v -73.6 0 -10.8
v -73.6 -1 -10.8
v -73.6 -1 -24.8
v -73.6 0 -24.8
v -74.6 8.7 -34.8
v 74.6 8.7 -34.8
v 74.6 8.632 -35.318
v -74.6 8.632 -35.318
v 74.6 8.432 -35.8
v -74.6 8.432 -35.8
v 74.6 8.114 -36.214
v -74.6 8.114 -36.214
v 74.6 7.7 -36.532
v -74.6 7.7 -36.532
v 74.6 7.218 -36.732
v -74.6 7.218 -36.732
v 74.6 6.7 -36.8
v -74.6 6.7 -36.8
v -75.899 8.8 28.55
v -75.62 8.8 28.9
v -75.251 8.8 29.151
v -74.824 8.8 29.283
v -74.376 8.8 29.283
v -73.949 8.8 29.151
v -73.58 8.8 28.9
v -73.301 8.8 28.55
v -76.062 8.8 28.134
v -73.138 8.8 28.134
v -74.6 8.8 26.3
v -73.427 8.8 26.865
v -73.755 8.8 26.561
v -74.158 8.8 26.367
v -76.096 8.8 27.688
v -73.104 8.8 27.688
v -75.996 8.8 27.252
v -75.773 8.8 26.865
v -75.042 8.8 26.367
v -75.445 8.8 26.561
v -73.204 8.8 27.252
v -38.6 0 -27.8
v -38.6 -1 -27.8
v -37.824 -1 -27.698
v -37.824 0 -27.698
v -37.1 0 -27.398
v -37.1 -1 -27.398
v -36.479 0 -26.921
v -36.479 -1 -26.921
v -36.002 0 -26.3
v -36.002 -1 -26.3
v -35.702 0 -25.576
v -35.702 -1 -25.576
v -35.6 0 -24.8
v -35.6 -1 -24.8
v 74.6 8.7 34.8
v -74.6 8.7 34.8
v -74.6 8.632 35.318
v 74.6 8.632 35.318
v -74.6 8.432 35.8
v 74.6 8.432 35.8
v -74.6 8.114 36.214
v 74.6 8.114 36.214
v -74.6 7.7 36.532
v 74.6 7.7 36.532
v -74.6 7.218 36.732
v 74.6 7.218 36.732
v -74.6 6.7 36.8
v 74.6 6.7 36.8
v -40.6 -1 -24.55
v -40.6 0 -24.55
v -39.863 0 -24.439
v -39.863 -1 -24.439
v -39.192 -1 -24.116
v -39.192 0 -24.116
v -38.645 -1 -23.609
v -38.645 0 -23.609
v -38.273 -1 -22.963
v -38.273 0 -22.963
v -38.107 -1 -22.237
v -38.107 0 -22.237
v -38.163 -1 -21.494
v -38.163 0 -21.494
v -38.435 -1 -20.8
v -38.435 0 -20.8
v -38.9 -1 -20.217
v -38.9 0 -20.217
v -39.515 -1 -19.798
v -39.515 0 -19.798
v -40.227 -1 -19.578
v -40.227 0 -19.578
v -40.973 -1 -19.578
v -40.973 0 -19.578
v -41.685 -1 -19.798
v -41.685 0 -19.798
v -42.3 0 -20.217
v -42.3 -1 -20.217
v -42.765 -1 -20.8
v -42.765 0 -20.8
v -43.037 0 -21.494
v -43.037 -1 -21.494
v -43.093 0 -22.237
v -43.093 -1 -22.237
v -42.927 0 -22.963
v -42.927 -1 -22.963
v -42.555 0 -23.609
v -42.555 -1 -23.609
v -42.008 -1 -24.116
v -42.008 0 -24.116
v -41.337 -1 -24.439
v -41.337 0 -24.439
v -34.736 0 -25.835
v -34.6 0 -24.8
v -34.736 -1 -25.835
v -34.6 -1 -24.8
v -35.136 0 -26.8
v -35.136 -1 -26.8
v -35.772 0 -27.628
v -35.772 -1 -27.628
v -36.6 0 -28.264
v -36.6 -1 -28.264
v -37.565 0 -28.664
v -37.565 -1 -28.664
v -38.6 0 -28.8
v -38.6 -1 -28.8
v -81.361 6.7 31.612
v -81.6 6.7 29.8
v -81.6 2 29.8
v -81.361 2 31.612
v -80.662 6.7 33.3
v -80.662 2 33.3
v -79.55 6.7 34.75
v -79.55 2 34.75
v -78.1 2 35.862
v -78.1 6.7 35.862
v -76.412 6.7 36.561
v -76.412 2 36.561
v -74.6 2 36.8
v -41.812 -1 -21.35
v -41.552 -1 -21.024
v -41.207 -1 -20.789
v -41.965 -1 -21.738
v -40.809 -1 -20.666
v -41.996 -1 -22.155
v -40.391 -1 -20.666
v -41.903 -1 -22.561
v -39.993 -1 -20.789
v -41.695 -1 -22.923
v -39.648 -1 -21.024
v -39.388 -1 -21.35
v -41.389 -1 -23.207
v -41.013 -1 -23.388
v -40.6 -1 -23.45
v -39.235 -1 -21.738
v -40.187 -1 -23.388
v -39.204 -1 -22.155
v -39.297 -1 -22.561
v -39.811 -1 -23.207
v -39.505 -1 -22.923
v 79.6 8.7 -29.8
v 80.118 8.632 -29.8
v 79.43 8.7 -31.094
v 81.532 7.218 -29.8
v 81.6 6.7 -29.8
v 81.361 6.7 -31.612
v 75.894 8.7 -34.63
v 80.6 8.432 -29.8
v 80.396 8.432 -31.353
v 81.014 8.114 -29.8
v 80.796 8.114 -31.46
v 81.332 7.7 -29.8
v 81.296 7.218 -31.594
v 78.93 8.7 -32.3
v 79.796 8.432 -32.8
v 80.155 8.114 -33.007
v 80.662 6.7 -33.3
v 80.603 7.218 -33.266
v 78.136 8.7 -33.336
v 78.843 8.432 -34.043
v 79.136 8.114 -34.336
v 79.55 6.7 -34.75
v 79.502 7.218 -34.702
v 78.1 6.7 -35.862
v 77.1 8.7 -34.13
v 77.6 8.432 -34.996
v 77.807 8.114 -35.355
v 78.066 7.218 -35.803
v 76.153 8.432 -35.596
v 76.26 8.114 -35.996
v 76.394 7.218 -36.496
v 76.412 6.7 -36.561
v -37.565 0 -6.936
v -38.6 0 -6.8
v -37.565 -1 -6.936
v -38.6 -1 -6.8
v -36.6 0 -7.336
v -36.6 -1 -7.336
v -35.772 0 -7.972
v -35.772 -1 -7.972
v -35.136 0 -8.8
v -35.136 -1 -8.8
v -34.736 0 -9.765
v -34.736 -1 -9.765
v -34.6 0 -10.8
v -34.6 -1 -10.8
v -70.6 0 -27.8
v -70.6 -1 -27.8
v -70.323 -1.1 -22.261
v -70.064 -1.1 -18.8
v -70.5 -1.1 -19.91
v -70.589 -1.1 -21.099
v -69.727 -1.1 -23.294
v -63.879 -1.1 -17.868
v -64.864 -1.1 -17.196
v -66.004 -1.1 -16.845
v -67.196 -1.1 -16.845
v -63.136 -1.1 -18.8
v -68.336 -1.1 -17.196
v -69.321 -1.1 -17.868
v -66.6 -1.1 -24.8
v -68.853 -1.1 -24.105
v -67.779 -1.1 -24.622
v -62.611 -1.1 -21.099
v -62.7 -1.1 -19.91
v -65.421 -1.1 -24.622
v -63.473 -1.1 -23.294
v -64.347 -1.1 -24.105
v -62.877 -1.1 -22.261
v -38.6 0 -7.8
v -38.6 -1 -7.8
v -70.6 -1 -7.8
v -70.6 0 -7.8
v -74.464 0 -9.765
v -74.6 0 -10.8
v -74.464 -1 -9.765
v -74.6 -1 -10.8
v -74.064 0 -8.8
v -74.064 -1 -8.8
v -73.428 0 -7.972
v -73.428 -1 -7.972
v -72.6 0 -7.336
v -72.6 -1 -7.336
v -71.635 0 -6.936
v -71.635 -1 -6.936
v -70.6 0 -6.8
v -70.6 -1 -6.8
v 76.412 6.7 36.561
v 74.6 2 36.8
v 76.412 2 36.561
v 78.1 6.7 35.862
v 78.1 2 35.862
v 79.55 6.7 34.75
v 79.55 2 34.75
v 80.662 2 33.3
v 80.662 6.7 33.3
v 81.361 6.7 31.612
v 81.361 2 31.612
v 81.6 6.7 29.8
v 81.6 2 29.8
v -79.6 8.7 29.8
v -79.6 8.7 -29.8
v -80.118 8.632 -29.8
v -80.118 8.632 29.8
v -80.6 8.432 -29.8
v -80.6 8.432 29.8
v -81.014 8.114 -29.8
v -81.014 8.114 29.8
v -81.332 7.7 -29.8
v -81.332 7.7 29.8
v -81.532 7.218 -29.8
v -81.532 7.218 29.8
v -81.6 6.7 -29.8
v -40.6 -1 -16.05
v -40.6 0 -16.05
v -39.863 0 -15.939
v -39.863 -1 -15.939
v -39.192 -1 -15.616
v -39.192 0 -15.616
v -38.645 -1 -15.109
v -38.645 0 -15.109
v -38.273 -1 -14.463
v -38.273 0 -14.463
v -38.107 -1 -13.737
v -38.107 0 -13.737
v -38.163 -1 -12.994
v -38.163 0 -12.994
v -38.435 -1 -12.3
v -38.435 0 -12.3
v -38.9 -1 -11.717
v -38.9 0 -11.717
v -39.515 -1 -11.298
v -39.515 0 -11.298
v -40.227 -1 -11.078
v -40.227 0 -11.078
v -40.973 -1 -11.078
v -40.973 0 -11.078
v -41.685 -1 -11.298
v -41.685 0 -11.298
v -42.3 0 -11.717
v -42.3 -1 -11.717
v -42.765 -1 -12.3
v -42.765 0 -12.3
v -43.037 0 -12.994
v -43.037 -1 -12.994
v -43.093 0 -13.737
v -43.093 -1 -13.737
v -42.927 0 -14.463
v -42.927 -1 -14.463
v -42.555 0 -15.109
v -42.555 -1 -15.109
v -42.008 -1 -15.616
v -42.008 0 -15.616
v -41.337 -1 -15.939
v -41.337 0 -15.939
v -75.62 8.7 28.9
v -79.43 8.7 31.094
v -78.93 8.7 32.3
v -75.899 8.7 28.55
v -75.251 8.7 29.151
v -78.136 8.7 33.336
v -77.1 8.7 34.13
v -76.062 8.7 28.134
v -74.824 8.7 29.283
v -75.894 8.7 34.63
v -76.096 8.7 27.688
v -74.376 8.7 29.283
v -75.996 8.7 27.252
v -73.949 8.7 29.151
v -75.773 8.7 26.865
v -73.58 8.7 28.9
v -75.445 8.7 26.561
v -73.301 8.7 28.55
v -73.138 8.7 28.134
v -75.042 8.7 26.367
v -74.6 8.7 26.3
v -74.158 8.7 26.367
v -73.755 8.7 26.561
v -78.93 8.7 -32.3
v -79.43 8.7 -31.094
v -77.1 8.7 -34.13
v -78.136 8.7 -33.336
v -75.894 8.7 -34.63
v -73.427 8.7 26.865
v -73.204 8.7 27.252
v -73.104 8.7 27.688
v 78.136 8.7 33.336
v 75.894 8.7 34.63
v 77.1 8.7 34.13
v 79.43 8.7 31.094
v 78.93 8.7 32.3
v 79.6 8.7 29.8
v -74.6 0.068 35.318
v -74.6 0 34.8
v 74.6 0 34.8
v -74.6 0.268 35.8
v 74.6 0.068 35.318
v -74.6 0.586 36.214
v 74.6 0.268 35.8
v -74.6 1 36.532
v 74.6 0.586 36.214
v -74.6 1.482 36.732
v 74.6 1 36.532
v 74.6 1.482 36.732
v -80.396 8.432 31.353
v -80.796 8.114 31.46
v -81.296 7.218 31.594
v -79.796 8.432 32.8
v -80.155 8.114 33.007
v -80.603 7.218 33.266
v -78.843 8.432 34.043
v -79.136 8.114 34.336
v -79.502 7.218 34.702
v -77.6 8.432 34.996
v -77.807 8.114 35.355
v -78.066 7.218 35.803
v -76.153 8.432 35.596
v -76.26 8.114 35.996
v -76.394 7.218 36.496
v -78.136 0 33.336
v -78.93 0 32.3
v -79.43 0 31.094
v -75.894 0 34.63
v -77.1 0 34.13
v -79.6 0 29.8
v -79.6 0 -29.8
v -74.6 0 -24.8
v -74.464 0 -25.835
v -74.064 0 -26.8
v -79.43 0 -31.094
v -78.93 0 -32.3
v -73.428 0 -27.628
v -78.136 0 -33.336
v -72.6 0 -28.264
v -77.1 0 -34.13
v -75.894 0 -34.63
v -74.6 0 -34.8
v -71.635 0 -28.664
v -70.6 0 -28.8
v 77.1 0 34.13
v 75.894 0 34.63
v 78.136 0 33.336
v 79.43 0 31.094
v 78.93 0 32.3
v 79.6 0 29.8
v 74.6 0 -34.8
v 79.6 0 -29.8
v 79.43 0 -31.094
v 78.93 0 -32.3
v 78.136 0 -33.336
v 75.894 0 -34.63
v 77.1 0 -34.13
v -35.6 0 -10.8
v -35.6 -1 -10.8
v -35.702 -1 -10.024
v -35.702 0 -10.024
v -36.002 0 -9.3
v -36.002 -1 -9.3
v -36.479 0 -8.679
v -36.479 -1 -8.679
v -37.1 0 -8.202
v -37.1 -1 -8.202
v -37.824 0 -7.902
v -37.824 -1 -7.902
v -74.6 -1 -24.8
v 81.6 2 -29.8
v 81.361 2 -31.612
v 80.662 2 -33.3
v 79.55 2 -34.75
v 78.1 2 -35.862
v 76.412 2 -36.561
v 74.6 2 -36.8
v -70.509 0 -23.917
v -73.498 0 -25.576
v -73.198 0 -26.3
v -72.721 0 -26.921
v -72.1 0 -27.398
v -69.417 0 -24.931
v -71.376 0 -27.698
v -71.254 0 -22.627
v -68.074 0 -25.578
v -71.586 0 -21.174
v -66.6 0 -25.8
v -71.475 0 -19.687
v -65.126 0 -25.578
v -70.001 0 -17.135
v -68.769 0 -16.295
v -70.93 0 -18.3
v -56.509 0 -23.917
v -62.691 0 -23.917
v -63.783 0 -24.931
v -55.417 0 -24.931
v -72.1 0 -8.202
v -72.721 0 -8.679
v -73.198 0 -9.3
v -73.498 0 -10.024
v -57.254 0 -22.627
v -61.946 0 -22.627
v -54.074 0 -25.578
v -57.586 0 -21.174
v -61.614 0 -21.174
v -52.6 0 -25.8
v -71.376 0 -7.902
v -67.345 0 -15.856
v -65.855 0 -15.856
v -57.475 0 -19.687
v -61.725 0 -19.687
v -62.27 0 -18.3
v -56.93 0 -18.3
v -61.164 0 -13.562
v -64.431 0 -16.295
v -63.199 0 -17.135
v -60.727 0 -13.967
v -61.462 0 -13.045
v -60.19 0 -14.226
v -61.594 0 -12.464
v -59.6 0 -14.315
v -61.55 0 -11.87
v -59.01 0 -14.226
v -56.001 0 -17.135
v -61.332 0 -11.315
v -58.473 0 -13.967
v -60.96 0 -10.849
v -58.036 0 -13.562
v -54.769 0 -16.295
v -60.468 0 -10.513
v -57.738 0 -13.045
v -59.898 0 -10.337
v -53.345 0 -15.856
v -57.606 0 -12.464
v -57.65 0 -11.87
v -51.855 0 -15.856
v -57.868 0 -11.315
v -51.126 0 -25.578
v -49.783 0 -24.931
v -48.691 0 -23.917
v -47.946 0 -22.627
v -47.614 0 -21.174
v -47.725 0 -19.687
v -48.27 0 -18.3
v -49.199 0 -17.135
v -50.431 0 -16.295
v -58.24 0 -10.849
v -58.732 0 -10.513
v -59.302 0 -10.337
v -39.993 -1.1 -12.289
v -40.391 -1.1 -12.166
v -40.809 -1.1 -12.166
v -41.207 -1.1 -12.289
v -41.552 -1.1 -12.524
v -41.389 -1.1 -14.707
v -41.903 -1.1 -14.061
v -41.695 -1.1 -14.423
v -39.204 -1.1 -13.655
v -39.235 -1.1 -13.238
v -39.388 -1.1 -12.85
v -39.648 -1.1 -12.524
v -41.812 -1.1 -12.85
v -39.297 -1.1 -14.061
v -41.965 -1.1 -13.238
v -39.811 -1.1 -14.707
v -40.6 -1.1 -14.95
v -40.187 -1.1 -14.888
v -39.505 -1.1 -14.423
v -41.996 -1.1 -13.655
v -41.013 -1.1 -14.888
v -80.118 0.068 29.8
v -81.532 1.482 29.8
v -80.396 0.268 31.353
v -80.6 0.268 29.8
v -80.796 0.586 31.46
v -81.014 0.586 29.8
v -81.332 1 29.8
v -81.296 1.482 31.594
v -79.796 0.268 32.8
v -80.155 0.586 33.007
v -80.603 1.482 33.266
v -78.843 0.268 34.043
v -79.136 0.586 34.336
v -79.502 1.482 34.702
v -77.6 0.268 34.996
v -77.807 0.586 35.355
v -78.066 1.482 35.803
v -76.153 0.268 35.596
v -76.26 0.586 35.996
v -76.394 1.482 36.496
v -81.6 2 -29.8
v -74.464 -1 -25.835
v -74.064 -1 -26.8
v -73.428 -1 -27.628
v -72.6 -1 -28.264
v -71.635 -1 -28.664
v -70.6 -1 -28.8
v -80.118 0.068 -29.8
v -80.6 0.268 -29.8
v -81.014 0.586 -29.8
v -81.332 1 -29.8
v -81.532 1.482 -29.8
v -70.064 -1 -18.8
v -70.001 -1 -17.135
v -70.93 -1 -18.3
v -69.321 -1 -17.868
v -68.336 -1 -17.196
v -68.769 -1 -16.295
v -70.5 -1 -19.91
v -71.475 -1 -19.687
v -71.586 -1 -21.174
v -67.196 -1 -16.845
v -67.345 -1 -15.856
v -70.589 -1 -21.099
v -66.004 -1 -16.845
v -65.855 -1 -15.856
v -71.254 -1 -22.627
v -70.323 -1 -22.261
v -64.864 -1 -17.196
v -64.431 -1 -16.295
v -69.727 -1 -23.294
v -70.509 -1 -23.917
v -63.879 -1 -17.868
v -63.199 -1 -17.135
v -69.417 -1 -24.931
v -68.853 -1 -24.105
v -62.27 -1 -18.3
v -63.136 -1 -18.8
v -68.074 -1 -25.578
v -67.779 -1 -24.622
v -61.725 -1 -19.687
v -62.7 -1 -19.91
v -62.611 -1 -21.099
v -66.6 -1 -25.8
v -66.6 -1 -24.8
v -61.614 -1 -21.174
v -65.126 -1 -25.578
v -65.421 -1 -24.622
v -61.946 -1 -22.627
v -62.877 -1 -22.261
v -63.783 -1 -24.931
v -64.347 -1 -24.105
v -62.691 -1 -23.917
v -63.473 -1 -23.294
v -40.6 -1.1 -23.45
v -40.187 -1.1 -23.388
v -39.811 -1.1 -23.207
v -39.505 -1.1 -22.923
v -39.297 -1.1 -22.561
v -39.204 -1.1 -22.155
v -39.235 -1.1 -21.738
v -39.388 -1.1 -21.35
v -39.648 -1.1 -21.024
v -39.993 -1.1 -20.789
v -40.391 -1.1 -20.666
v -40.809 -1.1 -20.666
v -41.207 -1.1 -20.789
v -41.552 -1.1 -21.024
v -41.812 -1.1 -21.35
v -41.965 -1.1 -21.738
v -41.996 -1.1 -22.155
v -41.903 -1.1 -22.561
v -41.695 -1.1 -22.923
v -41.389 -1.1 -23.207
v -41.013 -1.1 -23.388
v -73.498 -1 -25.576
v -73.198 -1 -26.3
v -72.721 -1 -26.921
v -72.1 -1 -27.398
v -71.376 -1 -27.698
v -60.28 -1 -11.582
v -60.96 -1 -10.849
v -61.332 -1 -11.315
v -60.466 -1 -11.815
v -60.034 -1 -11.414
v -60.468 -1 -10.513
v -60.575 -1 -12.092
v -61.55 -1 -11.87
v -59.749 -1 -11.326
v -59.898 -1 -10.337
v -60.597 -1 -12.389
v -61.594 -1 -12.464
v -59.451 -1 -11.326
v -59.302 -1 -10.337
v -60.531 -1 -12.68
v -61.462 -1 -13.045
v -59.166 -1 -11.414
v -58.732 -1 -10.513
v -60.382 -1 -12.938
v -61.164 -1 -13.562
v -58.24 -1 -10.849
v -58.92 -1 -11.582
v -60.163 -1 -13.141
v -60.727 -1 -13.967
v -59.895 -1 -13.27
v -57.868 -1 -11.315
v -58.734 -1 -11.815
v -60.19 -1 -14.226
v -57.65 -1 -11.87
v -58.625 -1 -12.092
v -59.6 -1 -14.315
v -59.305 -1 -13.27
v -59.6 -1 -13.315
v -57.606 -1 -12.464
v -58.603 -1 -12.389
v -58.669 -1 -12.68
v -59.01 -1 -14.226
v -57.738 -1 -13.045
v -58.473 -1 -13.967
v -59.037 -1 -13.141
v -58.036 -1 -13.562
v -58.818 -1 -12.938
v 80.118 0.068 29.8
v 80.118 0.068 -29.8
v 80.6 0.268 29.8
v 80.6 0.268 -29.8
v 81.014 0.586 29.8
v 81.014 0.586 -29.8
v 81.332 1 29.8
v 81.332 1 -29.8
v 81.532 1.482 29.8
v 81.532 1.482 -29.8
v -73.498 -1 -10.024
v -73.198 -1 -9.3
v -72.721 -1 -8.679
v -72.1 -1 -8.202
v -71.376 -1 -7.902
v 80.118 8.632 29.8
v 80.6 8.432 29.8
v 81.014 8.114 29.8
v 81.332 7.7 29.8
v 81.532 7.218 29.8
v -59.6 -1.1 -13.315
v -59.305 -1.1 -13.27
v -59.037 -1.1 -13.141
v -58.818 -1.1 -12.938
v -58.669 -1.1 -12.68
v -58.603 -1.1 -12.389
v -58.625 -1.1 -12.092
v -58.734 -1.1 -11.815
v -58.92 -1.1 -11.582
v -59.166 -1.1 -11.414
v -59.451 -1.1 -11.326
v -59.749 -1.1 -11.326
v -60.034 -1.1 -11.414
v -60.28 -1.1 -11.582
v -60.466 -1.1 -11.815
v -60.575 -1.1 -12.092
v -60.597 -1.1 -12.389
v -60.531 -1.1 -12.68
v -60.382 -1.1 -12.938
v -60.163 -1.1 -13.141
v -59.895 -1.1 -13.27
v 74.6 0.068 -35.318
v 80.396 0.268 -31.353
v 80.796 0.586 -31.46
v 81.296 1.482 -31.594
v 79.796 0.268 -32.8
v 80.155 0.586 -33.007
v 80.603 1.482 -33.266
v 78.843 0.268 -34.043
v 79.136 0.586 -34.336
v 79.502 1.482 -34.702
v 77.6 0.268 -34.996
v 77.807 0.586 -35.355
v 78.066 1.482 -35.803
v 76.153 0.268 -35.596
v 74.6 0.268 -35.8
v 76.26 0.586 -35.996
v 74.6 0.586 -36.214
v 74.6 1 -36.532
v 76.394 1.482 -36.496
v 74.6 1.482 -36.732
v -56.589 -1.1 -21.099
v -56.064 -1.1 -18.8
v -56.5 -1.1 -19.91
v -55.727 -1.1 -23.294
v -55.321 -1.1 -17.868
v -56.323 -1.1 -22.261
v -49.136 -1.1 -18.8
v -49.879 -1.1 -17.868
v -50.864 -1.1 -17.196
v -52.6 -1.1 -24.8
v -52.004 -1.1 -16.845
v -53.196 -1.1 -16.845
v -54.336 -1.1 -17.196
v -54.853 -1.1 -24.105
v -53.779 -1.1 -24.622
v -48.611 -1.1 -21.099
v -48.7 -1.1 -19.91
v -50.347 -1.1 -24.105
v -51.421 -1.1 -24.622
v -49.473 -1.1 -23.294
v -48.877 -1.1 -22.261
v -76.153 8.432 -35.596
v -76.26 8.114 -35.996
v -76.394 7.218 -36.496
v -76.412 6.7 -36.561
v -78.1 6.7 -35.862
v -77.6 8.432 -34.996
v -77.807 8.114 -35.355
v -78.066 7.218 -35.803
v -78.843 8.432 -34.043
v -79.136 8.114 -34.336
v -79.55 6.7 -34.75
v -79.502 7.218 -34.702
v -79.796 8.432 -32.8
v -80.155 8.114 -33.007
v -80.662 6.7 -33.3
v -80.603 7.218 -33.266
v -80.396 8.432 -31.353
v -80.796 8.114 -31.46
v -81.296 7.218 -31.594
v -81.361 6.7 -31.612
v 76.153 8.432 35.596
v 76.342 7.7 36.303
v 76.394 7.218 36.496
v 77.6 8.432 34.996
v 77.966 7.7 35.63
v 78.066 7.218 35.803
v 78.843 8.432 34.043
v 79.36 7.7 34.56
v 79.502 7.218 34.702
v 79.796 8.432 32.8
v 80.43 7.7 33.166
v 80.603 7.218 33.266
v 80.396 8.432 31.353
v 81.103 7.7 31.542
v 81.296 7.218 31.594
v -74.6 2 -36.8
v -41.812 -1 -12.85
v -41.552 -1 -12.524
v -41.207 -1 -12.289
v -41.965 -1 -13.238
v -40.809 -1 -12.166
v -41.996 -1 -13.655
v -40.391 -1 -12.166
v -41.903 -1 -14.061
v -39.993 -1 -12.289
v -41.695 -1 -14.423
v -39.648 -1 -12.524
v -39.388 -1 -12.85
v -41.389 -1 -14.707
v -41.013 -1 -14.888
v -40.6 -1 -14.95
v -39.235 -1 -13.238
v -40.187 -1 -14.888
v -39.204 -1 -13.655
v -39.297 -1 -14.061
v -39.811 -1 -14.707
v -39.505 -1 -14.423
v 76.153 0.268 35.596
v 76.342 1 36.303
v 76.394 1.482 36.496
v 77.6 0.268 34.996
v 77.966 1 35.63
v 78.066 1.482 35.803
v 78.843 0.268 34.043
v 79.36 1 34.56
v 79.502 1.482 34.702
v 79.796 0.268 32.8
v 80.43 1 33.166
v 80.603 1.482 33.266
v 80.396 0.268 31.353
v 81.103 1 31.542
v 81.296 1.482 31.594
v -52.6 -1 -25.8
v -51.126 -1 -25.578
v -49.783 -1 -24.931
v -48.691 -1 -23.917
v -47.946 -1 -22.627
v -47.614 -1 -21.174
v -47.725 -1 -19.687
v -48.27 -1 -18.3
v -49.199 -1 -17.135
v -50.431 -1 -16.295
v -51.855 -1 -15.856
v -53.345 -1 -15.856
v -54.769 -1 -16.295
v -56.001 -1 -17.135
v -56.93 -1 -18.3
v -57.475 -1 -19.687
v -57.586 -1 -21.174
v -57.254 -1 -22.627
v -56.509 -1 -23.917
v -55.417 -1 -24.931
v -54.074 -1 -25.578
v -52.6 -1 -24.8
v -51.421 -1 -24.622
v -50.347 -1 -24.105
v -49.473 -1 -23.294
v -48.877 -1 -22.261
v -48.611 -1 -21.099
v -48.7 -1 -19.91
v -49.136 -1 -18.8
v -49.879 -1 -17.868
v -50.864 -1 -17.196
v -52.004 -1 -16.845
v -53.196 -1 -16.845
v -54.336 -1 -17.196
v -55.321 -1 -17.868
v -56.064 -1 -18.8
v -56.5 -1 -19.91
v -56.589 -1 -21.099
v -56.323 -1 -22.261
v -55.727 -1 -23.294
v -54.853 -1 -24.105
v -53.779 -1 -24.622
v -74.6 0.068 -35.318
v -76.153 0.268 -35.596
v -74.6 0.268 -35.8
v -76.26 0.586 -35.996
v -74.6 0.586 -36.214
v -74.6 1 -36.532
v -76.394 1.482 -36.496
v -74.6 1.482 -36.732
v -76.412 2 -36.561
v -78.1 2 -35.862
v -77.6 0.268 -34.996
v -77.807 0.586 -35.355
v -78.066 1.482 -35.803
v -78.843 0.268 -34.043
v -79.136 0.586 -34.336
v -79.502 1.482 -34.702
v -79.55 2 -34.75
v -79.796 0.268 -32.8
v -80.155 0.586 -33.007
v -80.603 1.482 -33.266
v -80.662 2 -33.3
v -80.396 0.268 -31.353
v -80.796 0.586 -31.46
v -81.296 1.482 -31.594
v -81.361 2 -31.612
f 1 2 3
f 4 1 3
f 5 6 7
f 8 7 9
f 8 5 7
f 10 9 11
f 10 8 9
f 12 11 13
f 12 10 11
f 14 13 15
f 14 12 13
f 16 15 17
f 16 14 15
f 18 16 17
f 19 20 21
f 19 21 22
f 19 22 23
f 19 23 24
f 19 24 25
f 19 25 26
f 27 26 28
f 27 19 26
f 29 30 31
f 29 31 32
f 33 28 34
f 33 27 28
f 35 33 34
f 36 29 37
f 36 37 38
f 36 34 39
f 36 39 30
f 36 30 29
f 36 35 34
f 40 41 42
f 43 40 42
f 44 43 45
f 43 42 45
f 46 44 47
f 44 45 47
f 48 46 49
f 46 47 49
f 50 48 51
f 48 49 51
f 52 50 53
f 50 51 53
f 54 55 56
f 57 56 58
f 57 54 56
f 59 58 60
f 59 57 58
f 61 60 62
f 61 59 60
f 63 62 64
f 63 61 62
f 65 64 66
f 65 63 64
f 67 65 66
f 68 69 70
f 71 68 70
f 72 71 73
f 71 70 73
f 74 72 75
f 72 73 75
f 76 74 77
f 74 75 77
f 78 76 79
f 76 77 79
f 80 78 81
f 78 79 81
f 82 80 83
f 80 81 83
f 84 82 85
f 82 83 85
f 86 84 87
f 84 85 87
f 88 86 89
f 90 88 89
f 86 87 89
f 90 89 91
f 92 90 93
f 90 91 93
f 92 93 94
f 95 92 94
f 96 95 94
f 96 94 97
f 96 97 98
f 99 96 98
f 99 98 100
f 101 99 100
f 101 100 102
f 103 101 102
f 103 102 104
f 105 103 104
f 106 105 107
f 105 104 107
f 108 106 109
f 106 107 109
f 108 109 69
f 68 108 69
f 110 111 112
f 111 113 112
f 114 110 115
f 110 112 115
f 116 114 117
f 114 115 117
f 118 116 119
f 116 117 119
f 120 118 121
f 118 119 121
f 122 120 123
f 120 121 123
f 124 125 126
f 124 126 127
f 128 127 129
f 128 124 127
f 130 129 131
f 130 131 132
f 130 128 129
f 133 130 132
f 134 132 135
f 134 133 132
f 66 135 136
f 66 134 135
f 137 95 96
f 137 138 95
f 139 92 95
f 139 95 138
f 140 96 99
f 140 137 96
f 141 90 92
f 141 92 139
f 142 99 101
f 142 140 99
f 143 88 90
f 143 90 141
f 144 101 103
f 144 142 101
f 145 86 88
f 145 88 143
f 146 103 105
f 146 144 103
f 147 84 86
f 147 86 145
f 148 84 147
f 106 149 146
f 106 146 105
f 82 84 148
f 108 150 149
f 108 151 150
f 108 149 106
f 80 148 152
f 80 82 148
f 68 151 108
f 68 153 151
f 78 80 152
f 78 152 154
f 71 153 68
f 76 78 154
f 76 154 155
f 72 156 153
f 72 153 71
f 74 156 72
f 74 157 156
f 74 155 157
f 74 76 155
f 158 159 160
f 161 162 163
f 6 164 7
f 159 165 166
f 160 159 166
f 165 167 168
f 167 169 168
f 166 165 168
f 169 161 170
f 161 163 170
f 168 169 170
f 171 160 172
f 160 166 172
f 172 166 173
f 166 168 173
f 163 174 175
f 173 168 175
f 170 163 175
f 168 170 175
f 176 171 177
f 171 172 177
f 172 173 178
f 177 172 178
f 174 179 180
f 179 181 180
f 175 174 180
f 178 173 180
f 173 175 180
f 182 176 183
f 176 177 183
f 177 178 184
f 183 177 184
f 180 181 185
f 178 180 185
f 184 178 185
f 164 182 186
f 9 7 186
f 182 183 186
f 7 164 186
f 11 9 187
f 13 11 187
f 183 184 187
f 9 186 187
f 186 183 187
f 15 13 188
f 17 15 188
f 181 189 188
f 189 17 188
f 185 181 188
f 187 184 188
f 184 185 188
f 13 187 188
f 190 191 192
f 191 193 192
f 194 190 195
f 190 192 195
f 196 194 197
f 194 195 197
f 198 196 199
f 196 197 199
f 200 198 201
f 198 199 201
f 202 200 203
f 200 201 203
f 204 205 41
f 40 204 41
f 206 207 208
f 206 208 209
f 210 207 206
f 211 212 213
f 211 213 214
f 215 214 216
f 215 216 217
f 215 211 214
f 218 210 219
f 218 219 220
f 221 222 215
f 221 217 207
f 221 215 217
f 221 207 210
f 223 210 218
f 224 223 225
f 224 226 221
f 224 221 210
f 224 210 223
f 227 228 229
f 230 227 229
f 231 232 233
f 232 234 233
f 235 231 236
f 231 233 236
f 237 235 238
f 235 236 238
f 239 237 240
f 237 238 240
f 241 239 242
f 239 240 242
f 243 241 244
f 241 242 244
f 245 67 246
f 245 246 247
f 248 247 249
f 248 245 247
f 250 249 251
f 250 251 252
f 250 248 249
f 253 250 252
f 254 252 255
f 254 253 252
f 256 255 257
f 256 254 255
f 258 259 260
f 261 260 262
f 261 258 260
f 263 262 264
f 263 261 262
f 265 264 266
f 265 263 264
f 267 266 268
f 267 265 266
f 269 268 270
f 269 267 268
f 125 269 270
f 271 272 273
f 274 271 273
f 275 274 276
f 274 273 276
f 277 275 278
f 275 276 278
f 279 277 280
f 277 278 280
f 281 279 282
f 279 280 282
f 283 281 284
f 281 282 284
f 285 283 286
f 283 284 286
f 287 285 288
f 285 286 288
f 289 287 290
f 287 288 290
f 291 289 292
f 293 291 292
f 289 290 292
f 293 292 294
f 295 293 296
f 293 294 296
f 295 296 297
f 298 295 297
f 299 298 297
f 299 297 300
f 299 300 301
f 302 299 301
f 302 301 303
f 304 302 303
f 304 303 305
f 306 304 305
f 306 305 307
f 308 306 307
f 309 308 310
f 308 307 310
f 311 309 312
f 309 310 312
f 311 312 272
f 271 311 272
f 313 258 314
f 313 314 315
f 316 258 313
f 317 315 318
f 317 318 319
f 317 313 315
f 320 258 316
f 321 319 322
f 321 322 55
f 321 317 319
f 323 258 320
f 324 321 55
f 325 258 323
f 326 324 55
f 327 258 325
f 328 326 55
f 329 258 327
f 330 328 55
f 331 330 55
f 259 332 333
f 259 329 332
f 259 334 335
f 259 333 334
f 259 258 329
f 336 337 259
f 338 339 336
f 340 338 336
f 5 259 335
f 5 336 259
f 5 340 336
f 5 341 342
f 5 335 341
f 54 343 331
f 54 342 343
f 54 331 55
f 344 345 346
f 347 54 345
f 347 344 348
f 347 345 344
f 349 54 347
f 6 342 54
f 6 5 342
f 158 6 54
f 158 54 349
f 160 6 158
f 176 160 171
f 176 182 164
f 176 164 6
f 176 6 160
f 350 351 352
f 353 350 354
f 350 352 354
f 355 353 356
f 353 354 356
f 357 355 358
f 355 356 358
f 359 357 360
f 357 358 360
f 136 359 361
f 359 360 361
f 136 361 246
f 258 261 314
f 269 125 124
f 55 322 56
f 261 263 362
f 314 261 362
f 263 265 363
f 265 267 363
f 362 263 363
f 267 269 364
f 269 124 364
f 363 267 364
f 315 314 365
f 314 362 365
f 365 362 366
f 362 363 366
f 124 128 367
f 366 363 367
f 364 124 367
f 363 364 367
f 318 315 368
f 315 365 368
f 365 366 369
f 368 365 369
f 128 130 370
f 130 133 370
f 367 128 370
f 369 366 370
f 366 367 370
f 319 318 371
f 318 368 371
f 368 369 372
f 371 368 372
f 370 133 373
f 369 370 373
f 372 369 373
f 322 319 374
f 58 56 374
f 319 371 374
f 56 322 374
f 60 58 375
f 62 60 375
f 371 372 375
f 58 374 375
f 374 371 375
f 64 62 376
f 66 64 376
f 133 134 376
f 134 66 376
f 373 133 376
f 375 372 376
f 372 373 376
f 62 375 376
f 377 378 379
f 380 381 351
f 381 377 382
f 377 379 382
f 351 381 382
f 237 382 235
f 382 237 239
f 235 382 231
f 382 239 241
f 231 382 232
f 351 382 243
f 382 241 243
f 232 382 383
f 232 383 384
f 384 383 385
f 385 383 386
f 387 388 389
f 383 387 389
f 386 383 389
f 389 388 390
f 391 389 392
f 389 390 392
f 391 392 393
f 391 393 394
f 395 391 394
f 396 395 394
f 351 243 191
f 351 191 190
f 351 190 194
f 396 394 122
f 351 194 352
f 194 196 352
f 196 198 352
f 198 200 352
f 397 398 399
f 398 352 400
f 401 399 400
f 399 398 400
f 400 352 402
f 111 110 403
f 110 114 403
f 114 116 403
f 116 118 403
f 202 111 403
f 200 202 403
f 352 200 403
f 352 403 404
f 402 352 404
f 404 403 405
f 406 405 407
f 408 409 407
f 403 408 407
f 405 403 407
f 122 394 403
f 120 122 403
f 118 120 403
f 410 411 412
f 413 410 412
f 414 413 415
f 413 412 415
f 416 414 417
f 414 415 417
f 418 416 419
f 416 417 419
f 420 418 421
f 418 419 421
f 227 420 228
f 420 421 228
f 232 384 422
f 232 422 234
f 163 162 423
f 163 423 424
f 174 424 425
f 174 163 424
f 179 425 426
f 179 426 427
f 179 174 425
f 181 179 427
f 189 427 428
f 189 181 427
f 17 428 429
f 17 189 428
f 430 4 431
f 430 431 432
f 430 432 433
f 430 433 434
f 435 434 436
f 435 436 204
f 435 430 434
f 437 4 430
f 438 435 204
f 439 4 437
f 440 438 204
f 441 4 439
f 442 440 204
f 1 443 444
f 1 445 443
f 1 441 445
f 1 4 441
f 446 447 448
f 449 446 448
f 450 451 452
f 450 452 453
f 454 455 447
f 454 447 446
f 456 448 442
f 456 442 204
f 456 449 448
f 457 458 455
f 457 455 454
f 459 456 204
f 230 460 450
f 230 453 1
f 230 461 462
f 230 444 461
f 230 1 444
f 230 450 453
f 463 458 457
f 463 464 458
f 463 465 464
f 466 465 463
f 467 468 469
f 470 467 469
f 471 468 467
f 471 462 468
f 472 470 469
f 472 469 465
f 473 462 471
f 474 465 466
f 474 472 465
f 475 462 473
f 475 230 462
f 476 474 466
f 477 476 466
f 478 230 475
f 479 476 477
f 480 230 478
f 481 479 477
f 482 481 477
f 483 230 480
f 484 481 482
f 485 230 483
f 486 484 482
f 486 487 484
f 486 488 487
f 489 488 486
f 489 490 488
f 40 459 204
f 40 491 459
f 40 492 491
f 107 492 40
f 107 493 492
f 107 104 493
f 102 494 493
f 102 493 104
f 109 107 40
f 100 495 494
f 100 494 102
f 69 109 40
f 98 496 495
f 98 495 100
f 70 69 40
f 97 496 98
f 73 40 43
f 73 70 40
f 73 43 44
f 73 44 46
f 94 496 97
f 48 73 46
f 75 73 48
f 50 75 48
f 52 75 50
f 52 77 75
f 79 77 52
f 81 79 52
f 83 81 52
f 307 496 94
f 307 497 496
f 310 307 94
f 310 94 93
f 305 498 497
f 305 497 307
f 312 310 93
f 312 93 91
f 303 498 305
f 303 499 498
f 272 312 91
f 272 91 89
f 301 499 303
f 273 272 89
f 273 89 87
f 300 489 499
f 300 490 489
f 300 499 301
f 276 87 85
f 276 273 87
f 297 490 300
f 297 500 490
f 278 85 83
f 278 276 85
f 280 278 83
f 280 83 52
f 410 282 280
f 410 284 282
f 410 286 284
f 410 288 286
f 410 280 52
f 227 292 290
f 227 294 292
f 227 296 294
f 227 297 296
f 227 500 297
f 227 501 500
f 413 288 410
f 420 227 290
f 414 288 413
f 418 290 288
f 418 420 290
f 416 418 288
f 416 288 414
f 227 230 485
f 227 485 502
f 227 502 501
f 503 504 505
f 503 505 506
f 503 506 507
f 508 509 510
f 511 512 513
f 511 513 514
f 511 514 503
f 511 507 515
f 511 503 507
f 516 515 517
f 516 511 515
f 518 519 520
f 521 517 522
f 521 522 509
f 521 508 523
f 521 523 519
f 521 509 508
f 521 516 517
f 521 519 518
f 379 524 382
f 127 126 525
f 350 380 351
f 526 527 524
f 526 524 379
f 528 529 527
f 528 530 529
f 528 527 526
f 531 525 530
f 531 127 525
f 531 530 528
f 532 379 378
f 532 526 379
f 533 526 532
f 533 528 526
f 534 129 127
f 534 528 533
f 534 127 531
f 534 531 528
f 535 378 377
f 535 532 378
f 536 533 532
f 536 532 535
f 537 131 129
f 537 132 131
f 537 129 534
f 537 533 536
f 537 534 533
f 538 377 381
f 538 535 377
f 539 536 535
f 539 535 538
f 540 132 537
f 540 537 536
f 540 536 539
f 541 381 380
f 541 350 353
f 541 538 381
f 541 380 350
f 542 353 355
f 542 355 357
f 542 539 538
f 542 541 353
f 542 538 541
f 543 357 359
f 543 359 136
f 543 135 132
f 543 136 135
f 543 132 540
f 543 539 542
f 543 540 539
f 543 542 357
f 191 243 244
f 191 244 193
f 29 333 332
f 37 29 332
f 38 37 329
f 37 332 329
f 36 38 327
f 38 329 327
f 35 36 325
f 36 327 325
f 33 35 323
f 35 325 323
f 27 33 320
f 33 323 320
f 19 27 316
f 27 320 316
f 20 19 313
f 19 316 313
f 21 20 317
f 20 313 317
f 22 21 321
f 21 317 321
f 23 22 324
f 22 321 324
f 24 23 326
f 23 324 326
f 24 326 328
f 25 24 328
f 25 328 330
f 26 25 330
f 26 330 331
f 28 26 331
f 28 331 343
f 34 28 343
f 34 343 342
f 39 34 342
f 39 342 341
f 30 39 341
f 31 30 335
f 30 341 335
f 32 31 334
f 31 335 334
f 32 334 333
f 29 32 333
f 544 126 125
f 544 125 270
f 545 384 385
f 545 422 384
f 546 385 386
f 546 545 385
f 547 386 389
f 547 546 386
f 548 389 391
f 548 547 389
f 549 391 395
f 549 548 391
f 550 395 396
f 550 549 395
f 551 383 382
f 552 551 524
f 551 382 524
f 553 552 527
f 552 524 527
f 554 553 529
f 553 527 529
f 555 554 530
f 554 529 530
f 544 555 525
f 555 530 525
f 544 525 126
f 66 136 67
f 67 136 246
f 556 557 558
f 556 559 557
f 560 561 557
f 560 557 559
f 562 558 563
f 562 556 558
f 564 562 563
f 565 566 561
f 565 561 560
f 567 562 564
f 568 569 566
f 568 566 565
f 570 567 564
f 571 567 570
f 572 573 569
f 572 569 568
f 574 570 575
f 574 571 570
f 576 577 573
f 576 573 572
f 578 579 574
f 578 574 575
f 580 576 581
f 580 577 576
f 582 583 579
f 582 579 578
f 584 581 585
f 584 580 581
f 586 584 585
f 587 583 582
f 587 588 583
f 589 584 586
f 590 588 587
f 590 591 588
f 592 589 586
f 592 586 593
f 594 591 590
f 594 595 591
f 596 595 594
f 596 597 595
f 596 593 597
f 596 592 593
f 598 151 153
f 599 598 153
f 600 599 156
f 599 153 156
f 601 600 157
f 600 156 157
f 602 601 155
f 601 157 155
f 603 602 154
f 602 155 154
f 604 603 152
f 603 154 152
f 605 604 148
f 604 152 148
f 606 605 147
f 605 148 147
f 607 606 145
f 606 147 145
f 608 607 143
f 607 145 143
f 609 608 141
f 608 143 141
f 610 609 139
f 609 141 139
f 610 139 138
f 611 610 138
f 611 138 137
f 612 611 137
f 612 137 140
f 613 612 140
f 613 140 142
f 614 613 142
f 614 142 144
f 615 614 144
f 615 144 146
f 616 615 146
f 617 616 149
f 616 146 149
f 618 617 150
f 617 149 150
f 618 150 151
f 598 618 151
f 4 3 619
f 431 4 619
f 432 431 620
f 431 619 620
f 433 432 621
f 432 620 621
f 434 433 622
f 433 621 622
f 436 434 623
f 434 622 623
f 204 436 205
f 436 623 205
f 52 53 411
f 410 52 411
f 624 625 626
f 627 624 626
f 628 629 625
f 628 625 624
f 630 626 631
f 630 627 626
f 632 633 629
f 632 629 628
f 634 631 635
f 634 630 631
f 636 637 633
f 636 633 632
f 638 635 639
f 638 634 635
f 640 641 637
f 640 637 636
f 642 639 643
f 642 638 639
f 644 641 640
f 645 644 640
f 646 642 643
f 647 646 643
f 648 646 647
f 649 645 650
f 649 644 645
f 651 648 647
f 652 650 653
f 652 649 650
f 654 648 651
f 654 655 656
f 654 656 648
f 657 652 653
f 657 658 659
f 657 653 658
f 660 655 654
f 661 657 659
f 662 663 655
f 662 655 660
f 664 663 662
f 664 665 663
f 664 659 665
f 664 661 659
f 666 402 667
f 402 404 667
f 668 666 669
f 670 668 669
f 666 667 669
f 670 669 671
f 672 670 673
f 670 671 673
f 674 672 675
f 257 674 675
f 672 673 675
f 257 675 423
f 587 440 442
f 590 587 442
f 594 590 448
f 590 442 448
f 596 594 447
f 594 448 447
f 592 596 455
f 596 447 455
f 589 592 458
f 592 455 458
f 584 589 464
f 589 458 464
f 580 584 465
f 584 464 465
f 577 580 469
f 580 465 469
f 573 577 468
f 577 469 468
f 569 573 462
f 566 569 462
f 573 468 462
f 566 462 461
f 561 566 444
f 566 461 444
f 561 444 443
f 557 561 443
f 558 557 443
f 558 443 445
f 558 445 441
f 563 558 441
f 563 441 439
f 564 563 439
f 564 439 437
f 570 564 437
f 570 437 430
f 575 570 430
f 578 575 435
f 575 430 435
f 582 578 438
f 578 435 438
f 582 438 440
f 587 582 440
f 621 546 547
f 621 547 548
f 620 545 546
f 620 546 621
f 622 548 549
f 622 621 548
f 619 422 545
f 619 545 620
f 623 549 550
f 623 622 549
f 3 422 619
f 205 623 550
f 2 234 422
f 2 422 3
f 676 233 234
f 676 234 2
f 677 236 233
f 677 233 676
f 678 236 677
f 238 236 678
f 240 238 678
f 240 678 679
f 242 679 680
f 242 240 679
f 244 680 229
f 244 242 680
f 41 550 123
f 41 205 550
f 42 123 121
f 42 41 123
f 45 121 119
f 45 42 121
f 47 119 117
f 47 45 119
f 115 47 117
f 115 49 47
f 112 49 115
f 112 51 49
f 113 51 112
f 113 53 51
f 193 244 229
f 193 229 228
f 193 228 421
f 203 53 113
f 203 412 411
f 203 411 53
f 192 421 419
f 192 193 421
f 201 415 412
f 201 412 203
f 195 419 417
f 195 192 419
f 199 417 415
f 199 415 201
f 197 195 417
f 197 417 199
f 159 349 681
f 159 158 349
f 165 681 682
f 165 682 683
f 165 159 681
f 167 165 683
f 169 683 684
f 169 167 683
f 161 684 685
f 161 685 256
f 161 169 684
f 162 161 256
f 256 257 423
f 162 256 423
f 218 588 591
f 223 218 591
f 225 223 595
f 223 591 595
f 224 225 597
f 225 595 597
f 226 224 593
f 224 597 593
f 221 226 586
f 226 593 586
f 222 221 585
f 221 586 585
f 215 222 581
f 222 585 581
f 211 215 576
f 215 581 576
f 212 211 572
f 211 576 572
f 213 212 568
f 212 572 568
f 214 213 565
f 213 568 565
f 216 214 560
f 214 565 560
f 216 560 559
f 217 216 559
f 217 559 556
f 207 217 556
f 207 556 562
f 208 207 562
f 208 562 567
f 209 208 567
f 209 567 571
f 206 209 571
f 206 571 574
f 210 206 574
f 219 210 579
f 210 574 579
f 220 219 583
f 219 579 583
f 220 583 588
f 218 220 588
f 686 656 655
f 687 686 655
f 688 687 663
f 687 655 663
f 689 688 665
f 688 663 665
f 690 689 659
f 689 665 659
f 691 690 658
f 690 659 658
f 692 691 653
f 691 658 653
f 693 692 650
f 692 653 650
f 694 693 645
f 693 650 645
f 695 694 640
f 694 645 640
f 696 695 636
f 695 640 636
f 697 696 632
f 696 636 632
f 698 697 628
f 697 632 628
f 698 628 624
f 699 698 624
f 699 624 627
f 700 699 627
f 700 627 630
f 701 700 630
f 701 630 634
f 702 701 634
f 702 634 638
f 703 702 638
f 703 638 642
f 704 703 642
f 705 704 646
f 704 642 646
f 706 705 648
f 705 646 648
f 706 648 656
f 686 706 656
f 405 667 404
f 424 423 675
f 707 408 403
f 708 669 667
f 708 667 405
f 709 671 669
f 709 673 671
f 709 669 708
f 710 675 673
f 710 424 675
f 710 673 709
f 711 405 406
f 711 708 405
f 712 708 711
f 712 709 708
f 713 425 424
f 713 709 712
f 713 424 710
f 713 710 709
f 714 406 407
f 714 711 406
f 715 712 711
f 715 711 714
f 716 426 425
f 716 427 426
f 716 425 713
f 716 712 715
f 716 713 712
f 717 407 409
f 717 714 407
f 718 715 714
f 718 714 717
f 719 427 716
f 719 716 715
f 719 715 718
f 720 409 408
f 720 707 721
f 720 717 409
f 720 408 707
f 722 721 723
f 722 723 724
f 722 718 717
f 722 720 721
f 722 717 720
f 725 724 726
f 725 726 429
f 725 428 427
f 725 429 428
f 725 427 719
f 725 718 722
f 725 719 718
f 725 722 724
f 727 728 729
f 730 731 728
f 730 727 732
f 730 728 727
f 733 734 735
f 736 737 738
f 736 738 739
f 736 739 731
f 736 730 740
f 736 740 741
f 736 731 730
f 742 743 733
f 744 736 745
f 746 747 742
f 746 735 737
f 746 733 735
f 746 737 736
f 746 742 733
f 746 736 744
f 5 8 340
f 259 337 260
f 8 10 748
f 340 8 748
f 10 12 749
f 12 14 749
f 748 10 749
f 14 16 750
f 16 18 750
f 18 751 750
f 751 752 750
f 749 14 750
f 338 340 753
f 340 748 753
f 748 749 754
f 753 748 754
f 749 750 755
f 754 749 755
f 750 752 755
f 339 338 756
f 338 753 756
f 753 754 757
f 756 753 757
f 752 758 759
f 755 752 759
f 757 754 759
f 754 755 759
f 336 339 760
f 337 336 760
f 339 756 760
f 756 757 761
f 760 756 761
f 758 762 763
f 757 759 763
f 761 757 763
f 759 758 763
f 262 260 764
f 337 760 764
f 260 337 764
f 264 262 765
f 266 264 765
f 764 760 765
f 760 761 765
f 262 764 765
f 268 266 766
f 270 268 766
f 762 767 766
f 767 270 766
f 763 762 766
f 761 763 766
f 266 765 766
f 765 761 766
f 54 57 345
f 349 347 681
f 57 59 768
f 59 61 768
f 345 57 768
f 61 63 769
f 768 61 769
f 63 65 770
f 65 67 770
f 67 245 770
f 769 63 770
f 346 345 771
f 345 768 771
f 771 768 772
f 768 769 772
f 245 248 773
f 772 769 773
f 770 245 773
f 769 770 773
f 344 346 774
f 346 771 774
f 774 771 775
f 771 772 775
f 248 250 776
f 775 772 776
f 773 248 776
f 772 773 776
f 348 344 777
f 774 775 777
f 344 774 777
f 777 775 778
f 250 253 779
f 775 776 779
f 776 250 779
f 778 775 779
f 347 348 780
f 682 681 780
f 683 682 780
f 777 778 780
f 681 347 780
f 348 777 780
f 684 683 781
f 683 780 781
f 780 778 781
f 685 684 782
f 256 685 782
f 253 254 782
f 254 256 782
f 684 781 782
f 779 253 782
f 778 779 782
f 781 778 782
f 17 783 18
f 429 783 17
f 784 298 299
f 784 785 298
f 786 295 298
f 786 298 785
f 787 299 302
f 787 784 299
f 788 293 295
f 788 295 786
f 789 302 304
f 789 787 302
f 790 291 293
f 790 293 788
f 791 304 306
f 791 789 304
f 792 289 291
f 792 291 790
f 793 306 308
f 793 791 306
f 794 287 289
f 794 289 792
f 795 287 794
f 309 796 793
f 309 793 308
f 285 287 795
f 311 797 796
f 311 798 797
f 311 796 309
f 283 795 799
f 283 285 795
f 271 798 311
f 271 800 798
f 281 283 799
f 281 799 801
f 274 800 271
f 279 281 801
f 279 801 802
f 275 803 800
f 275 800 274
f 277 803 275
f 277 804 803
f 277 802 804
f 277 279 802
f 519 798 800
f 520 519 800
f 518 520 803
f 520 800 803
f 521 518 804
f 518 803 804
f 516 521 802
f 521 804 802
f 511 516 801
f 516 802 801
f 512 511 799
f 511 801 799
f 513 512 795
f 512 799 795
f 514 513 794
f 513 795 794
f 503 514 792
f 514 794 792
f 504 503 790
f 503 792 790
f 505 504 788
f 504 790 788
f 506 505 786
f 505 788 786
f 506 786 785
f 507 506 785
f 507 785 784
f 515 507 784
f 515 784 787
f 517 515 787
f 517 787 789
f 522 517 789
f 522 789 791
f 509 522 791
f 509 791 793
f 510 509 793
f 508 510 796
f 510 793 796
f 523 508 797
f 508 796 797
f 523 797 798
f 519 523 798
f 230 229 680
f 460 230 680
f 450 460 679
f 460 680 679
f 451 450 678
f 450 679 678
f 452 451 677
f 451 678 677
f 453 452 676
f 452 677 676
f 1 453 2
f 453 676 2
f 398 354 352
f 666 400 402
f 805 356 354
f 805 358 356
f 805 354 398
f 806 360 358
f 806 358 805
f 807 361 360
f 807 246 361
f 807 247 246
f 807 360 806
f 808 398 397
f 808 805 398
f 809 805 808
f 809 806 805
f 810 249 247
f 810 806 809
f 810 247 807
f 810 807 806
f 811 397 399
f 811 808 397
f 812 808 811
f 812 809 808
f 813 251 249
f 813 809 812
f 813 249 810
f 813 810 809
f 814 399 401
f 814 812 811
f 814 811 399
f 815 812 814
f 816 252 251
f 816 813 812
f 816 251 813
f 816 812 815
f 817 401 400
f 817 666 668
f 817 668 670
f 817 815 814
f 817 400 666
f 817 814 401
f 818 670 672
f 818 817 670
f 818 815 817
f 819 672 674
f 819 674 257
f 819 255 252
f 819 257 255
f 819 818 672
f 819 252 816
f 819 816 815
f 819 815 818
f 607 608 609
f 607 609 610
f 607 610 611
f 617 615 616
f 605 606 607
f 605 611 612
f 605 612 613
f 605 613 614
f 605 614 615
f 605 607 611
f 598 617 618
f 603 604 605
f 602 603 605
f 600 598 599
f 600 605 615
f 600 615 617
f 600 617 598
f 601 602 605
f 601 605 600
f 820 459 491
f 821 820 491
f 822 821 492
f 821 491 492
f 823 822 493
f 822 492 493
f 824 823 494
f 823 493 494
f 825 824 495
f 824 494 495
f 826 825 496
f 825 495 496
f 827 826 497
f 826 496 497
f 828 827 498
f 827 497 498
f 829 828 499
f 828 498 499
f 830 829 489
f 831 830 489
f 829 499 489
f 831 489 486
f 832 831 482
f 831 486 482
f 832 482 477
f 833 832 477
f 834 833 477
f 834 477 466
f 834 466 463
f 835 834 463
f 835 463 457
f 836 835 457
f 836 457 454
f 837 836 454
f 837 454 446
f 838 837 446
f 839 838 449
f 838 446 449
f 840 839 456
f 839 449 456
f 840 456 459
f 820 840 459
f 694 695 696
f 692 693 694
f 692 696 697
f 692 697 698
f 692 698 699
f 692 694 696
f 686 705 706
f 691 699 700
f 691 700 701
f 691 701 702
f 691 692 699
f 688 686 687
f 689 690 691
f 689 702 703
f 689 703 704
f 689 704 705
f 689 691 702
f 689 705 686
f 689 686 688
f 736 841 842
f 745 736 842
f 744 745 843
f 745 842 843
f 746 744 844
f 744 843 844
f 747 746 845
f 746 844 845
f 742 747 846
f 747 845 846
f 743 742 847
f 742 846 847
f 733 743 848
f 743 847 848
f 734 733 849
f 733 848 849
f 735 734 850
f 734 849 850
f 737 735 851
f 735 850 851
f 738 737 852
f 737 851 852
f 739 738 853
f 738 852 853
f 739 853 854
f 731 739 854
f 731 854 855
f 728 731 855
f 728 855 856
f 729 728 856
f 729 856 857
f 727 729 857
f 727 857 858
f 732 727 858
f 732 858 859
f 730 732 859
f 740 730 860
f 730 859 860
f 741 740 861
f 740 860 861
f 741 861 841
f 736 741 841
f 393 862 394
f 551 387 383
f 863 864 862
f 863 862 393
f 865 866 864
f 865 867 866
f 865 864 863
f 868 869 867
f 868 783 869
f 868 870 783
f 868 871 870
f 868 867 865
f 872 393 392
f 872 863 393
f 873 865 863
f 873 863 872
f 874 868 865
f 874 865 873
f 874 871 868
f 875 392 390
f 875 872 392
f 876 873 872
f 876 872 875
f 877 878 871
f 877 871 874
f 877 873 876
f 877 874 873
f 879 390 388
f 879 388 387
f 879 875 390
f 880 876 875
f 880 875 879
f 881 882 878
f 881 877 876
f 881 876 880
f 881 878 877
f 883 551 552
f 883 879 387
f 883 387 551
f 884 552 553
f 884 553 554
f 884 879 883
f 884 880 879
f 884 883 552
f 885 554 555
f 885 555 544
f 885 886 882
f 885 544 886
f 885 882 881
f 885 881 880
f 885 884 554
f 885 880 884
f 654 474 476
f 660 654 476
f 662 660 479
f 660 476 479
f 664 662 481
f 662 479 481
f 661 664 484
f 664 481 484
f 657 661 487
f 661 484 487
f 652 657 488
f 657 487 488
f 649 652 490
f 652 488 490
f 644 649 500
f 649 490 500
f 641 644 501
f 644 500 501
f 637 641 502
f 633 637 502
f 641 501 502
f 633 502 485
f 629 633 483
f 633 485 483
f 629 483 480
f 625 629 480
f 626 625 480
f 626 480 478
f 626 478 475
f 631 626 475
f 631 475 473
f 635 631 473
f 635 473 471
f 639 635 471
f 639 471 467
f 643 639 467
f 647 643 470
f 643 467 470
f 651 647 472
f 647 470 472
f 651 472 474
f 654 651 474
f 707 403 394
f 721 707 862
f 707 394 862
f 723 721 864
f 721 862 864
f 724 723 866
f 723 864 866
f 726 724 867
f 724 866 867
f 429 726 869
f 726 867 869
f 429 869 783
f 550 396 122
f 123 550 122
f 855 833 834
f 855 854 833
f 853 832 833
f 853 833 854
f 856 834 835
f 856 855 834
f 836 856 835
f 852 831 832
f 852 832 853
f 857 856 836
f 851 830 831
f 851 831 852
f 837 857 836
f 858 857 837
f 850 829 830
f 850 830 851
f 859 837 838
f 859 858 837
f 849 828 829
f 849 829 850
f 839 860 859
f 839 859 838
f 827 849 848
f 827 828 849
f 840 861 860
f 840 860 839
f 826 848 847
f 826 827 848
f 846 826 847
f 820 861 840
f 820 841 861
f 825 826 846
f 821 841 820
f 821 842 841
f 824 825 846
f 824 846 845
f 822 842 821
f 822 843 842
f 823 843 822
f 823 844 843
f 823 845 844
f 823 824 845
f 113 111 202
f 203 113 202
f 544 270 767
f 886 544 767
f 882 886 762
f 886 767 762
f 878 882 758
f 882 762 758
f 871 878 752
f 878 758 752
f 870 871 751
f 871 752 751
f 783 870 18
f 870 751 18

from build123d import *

# Parameters (mm, degrees)
SKETCH1_W           = 163.2
SKETCH1_H           = 73.6
BOSS_EXTRUDE1_DEPTH = 8.7
FILLET1_R           = 7
FILLET2_R           = 2
SKETCH2_R           = 1.5
BOSS_EXTRUDE2_DEPTH = 0.1
FILLET3_R           = 2
SKETCH3_W           = 40
SKETCH3_H           = 22
BOSS_EXTRUDE3_DEPTH = 1
FILLET4_R           = 4
CUT_EXTRUDE1_DEPTH  = 1
SKETCH5_R           = 5
SKETCH5_R_2         = 2.5
SKETCH5_R_3         = 2
BOSS_EXTRUDE4_DEPTH = 1
SKETCH6_R           = 4
SKETCH6_R_2         = 1.4
SKETCH6_R_3         = 1
BOSS_EXTRUDE5_DEPTH = 0.1


with BuildPart() as part:
    # Sketch1 → Boss-Extrude1 (new body)
    with BuildSketch(Plane(origin=(0, 0, 0), x_dir=(1, 0, 0), z_dir=(0, 1, 0))):
        Rectangle(SKETCH1_W, SKETCH1_H)
    extrude(amount=BOSS_EXTRUDE1_DEPTH)

    # Fillet1
    fillet1_edges = [part.edges().sort_by_distance(p)[0] for p in [
        (81.6, 4.35, 36.8),
        (-81.6, 4.35, 36.8),
        (-81.6, 4.35, -36.8),
        (81.6, 4.35, -36.8),
    ]]
    fillet(fillet1_edges, radius=FILLET1_R)

    # Fillet2
    fillet2_edges = [part.edges().sort_by_distance(p)[0] for p in [
        (81.6, 8.7, 0),
        (0, 8.7, 36.8),
        (0, 8.7, -36.8),
        (-81.6, 8.7, 0),
        (-79.549747468, 8.7, 34.749747468),
        (-79.549747468, 8.7, -34.749747468),
        (79.549747468, 8.7, -34.749747468),
        (79.549747468, 8.7, 34.749747468),
    ]]
    fillet(fillet2_edges, radius=FILLET2_R)

    # Sketch2 → Boss-Extrude2 (add)
    with BuildSketch(Plane(origin=(0, 8.7, 0), x_dir=(1, 0, 0), z_dir=(0, 1, 0))):
        with Locations(Location((-74.6, -27.8, 0), (0, 0, 90))):
            Circle(SKETCH2_R)
    extrude(amount=BOSS_EXTRUDE2_DEPTH)

    # Fillet3
    fillet3_edges = [part.edges().sort_by_distance(p)[0] for p in [
        (81.6, 0, 0),
        (0, 0, 36.8),
        (-81.6, 0, 0),
        (0, 0, -36.8),
        (-79.549747468, 0, 34.749747468),
        (-79.549747468, 0, -34.749747468),
        (79.549747468, 0, -34.749747468),
        (79.549747468, 0, 34.749747468),
    ]]
    fillet(fillet3_edges, radius=FILLET3_R)

    # Sketch3 → Boss-Extrude3 (add)
    with BuildSketch(Plane.XZ):
        with Locations((-54.6, -17.8)):
            Rectangle(SKETCH3_W, SKETCH3_H)
    extrude(amount=BOSS_EXTRUDE3_DEPTH)

    # Fillet4
    fillet4_edges = [part.edges().sort_by_distance(p)[0] for p in [
        (-74.6, -0.5, -6.8),
        (-74.6, -0.5, -28.8),
        (-34.6, -0.5, -28.8),
        (-34.6, -0.5, -6.8),
    ]]
    fillet(fillet4_edges, radius=FILLET4_R)

    # Sketch4 → Cut-Extrude1 (cut)
    with BuildSketch(Plane.XZ.offset(1)):
        with BuildLine():
            Line((-70.6, -27.8), (-38.6, -27.8))
            ThreePointArc((-38.6, -27.8), (-36.478679656, -26.921320344), (-35.6, -24.8))
            Line((-35.6, -24.8), (-35.6, -10.8))
            ThreePointArc((-35.6, -10.8), (-36.478679656, -8.678679656), (-38.6, -7.8))
            Line((-38.6, -7.8), (-70.6, -7.8))
            ThreePointArc((-70.6, -7.8), (-72.721320344, -8.678679656), (-73.6, -10.8))
            Line((-73.6, -10.8), (-73.6, -24.8))
            ThreePointArc((-73.6, -24.8), (-72.721320344, -26.921320344), (-70.6, -27.8))
        make_face()
    extrude(amount=-CUT_EXTRUDE1_DEPTH, mode=Mode.SUBTRACT)

    # Sketch5 → Boss-Extrude4 (add)
    with BuildSketch(Plane(origin=(0, 0, 0), x_dir=(-1, 0, 0), z_dir=(0, -1, 0))):
        with Locations(Location((66.6, 20.8, 0), (0, 0, 90))):
            Circle(SKETCH5_R)
        with Locations(Location((52.6, 20.8, 0), (0, 0, 90))):
            Circle(SKETCH5_R)
        with Locations(Location((40.6, 22.05, 0), (0, 0, 90))):
            Circle(SKETCH5_R_2)
        with Locations(Location((40.6, 13.55, 0), (0, 0, 90))):
            Circle(SKETCH5_R_2)
        with Locations(Location((59.6, 12.314718626, 0), (0, 0, 90))):
            Circle(SKETCH5_R_3)
    extrude(amount=BOSS_EXTRUDE4_DEPTH)

    # Sketch6 → Boss-Extrude5 (add)
    with BuildSketch(Plane.XZ.offset(1)):
        with Locations(Location((-66.6, -20.8, 0), (0, 0, 270))):
            Circle(SKETCH6_R)
        with Locations(Location((-52.6, -20.8, 0), (0, 0, 270))):
            Circle(SKETCH6_R)
        with Locations(Location((-40.6, -22.05, 0), (0, 0, 270))):
            Circle(SKETCH6_R_2)
        with Locations(Location((-40.6, -13.55, 0), (0, 0, 270))):
            Circle(SKETCH6_R_2)
        with Locations(Location((-59.6, -12.314718626, 0), (0, 0, 270))):
            Circle(SKETCH6_R_3)
    extrude(amount=BOSS_EXTRUDE5_DEPTH)


solid = part.part
